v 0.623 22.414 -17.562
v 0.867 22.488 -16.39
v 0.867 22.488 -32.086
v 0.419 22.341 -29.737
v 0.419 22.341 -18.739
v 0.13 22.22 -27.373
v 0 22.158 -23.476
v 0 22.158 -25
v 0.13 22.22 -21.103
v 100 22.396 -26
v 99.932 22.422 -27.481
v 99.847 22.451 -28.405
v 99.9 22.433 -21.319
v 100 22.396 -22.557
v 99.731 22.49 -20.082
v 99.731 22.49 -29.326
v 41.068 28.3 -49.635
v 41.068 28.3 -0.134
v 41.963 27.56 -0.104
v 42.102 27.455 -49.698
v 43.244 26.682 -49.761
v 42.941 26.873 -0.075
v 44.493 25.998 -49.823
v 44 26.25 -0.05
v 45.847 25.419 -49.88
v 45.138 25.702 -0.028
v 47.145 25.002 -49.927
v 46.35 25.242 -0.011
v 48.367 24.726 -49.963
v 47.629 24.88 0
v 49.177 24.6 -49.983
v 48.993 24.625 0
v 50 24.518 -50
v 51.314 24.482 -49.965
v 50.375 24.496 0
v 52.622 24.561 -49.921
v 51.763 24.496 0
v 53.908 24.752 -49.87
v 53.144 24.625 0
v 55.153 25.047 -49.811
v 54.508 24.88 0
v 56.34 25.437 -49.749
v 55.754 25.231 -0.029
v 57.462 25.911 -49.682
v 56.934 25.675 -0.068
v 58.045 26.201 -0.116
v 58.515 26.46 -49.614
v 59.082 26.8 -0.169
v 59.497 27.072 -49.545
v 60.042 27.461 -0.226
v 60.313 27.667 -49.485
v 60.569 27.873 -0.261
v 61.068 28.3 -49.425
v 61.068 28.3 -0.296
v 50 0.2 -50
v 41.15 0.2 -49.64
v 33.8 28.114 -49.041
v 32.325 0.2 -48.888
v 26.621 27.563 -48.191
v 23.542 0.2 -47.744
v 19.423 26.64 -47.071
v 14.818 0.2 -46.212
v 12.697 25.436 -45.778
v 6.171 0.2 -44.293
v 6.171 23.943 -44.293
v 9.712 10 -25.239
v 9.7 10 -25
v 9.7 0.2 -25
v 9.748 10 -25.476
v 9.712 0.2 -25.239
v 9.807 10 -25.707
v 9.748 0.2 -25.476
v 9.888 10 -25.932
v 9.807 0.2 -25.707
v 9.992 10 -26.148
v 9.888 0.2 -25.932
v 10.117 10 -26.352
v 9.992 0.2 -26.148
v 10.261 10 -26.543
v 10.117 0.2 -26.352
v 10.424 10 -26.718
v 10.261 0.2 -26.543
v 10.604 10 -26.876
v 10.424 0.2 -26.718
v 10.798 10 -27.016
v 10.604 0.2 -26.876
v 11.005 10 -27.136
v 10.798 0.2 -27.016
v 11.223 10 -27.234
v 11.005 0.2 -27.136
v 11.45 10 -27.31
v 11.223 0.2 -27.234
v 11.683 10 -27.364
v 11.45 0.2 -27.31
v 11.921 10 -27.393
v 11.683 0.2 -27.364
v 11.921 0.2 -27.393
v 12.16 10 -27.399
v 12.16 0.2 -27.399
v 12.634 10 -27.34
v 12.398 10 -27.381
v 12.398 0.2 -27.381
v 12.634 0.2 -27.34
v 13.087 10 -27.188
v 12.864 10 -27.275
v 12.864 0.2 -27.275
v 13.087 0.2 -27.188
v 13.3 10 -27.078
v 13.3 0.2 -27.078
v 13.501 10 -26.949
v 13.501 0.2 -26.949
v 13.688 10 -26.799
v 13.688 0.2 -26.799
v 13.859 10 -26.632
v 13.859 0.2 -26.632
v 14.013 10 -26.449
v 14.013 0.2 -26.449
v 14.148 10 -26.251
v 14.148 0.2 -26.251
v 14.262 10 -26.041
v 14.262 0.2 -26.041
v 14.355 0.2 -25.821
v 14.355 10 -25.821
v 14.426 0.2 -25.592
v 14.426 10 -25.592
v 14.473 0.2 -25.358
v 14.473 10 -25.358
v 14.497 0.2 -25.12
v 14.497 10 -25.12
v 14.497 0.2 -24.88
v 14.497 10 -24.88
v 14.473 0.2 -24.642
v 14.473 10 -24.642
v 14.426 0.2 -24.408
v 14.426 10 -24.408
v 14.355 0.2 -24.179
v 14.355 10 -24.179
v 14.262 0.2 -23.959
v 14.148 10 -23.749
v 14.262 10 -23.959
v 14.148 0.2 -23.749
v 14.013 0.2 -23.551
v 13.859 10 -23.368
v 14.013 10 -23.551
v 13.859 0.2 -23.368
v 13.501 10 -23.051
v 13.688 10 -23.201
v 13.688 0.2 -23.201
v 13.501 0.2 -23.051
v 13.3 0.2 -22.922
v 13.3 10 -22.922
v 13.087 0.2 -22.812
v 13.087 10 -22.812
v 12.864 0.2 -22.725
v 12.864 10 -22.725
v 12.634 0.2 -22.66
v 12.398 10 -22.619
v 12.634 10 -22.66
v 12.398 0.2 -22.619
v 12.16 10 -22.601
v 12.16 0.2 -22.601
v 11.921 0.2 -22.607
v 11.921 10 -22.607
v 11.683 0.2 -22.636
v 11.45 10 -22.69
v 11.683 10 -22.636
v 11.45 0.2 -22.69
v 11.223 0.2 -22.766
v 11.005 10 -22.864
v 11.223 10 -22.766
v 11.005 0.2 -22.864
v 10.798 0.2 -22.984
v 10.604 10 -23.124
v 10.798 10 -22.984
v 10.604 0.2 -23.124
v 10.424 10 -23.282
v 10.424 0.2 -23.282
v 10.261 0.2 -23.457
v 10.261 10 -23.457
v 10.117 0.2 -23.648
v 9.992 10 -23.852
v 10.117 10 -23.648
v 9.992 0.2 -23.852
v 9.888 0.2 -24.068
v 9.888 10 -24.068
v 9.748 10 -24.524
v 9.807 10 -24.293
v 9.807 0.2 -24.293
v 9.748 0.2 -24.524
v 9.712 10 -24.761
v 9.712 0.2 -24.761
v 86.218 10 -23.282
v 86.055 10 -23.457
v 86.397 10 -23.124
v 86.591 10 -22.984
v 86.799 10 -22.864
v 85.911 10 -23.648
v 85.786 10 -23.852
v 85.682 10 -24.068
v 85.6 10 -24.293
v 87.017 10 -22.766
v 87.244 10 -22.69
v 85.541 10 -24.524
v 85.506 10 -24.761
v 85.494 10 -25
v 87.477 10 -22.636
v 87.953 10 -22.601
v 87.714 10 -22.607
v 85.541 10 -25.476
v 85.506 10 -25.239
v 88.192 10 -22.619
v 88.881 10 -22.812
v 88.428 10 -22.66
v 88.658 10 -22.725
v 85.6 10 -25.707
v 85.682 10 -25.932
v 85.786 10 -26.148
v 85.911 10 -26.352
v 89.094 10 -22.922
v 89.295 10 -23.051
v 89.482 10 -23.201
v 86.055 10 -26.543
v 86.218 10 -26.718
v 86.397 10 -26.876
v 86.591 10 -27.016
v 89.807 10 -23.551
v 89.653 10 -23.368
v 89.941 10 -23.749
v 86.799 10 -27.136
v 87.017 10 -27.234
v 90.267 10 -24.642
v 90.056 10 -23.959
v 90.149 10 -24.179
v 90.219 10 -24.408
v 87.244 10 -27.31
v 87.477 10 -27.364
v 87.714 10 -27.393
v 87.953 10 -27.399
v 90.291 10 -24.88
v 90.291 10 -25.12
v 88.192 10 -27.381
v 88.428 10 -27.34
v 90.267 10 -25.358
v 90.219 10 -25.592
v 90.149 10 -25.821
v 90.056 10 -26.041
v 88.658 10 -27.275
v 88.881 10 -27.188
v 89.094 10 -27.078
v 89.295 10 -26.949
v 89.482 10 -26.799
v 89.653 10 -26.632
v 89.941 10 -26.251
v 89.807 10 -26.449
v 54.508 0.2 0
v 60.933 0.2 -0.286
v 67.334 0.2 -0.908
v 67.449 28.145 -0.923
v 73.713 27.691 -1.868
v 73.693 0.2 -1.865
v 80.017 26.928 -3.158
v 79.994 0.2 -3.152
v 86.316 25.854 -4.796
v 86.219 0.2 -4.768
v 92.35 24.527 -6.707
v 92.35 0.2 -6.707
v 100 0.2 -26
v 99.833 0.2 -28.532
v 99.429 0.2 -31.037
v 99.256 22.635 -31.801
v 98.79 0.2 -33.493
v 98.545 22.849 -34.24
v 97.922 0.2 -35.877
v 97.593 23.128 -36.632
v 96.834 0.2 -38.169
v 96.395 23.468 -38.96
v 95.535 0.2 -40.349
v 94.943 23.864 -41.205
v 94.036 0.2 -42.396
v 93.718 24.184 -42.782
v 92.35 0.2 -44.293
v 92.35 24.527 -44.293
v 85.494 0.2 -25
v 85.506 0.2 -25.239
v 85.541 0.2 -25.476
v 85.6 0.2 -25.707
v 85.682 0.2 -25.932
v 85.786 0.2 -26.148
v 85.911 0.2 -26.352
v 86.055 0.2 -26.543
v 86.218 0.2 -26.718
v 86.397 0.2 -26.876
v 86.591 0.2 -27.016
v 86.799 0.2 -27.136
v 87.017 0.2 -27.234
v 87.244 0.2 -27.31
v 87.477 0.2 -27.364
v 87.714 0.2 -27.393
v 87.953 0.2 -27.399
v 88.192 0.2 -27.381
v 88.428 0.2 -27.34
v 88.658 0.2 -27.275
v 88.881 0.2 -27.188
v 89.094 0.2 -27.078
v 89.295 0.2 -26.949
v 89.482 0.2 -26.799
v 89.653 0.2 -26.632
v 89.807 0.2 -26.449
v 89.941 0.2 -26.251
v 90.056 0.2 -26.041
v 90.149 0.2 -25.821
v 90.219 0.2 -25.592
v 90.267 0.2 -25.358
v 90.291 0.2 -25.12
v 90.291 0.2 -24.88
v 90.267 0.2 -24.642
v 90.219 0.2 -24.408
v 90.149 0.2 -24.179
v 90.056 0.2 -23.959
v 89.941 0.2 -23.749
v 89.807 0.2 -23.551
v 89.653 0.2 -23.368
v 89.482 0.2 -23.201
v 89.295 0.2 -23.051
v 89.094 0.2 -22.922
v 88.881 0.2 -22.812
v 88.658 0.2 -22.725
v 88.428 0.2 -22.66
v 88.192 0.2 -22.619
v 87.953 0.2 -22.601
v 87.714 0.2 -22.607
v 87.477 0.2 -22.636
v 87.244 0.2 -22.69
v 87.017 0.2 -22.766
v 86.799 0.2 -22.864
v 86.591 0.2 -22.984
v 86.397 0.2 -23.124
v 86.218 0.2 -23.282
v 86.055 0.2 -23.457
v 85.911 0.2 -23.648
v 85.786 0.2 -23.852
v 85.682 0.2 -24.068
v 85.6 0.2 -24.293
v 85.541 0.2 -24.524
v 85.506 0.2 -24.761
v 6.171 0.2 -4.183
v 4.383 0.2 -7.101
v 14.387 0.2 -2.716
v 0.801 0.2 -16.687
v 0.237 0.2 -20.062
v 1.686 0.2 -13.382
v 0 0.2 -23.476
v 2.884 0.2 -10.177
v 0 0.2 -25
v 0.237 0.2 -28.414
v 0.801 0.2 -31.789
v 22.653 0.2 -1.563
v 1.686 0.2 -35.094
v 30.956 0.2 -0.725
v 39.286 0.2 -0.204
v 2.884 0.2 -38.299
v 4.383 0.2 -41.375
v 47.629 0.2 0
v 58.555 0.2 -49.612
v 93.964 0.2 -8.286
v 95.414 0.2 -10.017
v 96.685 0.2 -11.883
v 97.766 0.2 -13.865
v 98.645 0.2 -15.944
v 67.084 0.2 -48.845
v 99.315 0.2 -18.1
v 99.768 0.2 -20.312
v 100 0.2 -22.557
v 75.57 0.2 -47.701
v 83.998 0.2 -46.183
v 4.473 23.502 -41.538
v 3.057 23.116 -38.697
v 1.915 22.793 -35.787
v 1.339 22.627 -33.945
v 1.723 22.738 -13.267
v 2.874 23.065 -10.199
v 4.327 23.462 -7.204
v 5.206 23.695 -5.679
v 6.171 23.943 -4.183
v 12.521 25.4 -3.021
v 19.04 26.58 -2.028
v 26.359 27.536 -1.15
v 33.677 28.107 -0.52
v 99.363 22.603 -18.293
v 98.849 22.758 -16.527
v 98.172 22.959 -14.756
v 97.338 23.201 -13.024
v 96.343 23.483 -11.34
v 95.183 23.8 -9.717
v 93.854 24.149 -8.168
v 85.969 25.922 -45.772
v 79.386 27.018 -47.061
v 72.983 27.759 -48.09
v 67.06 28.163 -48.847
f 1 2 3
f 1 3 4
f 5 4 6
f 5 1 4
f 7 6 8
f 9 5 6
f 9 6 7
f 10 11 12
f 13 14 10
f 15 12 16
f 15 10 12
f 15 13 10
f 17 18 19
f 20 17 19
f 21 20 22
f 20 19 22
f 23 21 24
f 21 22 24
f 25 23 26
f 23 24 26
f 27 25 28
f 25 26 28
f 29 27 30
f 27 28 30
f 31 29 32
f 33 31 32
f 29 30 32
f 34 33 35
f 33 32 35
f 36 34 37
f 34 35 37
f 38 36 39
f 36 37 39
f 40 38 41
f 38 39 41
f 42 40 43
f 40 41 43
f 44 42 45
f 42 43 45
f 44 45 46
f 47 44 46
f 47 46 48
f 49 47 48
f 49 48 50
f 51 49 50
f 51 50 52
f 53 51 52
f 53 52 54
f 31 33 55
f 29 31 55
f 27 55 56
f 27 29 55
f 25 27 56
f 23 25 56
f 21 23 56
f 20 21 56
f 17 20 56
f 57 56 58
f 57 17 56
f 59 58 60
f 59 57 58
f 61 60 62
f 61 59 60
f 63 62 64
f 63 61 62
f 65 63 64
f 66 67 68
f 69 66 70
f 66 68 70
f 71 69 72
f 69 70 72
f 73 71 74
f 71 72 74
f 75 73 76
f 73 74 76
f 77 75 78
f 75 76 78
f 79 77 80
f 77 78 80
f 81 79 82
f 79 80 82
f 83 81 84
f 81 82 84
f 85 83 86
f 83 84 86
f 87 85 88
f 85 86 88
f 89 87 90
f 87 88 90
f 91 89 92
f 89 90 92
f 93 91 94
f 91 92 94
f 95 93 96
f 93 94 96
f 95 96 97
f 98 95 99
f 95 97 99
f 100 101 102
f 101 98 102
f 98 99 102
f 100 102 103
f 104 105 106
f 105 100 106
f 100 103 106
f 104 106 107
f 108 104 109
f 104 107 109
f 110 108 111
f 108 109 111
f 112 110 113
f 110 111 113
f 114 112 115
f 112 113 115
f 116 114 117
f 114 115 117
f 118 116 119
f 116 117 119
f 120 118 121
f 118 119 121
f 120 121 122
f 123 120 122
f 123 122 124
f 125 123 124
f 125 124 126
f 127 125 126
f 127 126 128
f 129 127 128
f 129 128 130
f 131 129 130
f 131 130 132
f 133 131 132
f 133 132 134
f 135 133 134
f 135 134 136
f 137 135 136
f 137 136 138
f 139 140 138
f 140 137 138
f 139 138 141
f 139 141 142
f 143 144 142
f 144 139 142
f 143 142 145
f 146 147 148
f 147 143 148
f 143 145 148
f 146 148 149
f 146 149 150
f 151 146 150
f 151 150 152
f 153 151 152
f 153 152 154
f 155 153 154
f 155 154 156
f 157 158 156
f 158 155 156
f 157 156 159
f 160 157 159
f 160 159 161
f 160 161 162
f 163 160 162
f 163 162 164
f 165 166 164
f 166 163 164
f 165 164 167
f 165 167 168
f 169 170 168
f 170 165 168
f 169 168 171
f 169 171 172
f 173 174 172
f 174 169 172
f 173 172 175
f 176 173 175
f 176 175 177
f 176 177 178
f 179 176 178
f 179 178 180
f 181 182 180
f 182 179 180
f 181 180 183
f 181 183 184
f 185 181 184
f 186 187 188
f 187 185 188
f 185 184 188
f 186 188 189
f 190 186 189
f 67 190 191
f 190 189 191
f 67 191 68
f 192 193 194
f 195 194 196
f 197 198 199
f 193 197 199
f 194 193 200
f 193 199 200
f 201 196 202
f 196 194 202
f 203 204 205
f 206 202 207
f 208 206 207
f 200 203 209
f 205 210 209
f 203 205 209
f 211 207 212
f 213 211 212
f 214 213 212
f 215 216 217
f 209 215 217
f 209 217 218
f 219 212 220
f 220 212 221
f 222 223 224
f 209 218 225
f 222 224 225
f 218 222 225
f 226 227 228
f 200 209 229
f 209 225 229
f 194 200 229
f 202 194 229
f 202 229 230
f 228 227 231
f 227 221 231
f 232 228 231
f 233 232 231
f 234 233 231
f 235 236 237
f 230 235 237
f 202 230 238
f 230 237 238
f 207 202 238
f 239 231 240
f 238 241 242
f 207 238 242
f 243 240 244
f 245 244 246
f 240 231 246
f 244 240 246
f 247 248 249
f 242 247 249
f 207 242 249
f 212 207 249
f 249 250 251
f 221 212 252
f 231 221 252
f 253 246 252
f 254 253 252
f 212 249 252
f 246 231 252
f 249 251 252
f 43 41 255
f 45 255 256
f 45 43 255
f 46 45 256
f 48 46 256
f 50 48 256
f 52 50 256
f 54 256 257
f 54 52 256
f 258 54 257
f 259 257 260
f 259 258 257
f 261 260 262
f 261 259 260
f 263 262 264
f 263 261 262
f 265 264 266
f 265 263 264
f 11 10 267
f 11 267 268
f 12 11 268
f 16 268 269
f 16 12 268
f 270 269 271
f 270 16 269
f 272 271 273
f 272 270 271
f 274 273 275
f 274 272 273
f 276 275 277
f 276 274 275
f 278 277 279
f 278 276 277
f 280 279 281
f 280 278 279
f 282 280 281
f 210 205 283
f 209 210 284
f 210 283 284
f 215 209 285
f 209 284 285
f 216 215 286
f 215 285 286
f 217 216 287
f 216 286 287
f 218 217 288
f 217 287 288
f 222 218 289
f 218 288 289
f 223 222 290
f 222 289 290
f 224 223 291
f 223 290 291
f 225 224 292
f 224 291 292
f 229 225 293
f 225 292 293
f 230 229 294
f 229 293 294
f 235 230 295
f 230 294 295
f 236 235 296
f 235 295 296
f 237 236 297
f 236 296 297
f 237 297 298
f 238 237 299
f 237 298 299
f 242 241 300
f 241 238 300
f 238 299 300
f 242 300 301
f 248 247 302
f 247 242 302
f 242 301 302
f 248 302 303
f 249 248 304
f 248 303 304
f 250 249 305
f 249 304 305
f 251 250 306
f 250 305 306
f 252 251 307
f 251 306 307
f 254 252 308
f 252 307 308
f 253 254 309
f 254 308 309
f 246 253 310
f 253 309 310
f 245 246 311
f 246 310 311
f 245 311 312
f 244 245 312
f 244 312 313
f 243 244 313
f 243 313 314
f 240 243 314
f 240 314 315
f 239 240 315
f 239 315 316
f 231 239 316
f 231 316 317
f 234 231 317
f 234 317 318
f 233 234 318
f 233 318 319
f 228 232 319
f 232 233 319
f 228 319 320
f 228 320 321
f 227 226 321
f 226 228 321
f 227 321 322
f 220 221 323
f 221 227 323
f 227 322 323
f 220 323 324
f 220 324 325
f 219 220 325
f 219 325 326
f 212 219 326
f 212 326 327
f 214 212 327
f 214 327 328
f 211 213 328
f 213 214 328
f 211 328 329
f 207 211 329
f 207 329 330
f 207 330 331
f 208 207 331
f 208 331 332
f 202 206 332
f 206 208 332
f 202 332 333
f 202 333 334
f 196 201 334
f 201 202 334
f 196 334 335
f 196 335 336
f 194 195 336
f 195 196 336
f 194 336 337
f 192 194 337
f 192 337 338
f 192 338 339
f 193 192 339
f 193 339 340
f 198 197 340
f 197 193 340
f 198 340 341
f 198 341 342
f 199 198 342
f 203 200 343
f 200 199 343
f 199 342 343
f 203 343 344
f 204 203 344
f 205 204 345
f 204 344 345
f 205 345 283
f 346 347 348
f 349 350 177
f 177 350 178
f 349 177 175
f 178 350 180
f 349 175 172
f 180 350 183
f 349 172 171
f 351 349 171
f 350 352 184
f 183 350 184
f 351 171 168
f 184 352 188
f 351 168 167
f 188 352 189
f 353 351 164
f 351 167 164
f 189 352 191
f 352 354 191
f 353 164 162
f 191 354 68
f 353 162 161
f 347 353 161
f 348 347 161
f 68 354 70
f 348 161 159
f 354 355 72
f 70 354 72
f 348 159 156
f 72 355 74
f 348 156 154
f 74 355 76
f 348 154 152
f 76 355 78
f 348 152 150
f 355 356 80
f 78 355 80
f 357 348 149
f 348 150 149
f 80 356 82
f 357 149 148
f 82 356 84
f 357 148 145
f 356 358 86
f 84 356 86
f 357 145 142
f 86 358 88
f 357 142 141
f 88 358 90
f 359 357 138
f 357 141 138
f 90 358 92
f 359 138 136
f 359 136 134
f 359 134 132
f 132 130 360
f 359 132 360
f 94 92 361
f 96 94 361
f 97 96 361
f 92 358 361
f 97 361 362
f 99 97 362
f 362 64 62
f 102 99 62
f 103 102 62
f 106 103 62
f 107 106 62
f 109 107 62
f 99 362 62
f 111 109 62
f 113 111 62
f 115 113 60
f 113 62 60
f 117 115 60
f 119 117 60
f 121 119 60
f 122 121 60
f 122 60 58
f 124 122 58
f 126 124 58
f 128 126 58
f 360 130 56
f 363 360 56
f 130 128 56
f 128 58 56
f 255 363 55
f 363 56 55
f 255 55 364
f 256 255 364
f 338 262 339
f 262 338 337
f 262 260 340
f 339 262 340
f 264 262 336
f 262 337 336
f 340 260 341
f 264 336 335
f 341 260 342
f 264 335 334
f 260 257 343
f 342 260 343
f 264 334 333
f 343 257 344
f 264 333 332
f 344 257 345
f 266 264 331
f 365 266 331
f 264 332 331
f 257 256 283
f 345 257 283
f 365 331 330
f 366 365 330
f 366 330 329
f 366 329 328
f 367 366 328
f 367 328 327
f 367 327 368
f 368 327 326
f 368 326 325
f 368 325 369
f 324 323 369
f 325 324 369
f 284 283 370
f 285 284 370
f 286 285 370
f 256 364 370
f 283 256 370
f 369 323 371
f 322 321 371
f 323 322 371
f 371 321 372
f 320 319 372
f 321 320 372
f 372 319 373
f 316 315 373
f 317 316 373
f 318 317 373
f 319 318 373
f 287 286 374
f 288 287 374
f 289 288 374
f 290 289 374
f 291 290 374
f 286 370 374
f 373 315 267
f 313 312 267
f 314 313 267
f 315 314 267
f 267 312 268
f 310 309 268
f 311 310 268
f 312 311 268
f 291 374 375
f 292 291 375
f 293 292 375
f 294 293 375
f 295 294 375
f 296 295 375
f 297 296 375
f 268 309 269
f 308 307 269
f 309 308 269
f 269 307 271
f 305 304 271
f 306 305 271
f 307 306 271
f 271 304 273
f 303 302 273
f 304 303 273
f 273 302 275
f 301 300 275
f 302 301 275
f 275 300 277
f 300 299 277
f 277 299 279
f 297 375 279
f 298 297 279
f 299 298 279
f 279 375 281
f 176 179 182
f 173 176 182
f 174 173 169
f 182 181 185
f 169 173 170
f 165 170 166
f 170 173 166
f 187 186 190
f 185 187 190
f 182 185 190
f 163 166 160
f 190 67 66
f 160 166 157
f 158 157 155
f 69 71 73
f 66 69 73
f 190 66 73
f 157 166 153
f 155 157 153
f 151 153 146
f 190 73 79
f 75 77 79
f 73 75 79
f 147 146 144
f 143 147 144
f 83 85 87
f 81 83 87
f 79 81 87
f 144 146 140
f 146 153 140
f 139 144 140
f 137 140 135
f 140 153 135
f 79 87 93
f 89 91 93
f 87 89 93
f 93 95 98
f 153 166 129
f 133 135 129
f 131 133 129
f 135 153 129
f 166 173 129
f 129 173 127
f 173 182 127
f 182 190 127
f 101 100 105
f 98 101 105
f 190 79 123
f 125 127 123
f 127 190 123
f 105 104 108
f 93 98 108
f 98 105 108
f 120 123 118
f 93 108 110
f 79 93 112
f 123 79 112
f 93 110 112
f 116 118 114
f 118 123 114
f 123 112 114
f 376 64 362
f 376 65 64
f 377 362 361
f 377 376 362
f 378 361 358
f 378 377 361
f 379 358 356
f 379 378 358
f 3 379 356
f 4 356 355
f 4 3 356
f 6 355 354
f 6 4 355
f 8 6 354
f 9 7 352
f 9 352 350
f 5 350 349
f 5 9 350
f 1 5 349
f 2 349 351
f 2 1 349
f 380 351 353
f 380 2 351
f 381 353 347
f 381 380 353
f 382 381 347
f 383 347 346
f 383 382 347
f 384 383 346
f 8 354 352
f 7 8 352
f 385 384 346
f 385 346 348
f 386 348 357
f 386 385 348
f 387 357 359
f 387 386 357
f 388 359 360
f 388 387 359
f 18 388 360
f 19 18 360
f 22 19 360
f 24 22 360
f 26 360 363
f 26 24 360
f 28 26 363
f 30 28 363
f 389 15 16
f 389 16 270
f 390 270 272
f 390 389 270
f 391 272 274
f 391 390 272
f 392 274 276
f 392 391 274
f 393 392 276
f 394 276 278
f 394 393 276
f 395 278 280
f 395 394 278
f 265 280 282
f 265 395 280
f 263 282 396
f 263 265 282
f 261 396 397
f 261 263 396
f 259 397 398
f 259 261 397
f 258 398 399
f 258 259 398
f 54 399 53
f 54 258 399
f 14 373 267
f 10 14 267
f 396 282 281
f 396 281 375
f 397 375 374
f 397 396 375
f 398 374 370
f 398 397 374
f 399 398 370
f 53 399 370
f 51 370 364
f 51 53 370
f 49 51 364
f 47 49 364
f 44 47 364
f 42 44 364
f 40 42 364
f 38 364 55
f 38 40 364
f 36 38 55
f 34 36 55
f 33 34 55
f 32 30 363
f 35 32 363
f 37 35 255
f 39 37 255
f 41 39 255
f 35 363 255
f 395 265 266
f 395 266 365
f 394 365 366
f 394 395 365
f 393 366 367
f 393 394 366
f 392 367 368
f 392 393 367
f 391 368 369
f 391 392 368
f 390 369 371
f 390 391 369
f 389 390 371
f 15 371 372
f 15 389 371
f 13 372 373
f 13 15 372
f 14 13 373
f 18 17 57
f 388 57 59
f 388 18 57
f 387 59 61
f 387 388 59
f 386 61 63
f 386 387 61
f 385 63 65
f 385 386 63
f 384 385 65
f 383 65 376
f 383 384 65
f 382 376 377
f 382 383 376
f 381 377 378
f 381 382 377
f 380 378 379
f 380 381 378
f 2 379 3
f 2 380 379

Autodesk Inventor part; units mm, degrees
ref_plane "YZ Plane" through (0, 0, 0) normal (1, 0, 0) x (0, 1, 0)
ref_plane "XZ Plane" through (0, 0, 0) normal (0, 1, 0) x (-1, 0, 0)
ref_plane "XY Plane" through (0, 0, 0) normal (0, 0, 1) x (1, 0, 0)
sketch "Sketch1" plane through (0, 0, 0) normal (0, 1, 0) x (-1, 0, 0)
  line L0 (-3, 0) -> (-97, 0)
  line L1 (-100, -3) -> (-100, -47)
  line L2 (-97, -50) -> (-3, -50)
  line L3 (0, -47) -> (0, -3)
  line L4 (0, -50) -> (0, -25)
  line L5 (0, -25) -> (-12.1, -25)
  circle A0 centre (-12.1, -25) radius 2.4
  line L6 (-12.1, -25) -> (-87.8936, -25)
  circle A1 centre (-87.8936, -25) radius 2.4
  arc A2 (0, -3) -> (-3, 0) centre (-3, -3) ccw
  arc A3 (-3, -50) -> (0, -47) centre (-3, -47) ccw
  arc A4 (-97, 0) -> (-100, -3) centre (-97, -3) ccw
  arc A5 (-100, -47) -> (-97, -50) centre (-97, -47) ccw
  point P0 (0, 0)
  point P1 (-100, -50)
  point P2 (-100, 0)
  dimension "d0" = 100
  dimension "d1" = 50
  dimension "d2" = 25
  dimension "d3" = 12.1
  dimension "d4" = 4.8
  dimension "d5" = 75.7936
  dimension "d6" = 4.8
  dimension "d7" = 3
extrude "Extrusion1" add sketch "Sketch1" along normal blind 10
sketch "Sketch2" plane through (0, 10, 0) normal (0, 1, 0) x (1, 0, 0)
  line L0 (2, 0) -> (98, 0)
  line L1 (100, 2) -> (100, 48)
  line L2 (98, 50) -> (2, 50)
  line L3 (0, 48) -> (0, 2)
  arc A0 (98, 0) -> (100, 2) centre (98, 2) ccw
  arc A1 (0, 2) -> (2, 0) centre (2, 2) ccw
  arc A2 (2, 50) -> (0, 48) centre (2, 48) ccw
  arc A3 (100, 48) -> (98, 50) centre (98, 48) ccw
  point P0 (0, 0)
  dimension "d10" = 2
extrude "Extrusion2" add sketch "Sketch2" along normal blind 18.3
sketch "Sketch3" plane through (3, 0, 0) normal (0, 0, 1) x (1, 0, 0)
  point P0 (-3, 0)
sketch "Sketch4" plane through (0, 28.3, 0) normal (0, 1, 0) x (1, 0, 0)
  line L0 (3, 0) -> (97, 0) projected
  arc A0 (6.1709, 4.1832) -> (50, 0) centre (48.8144, 219.278) ccw
  line L1 (0, 47) -> (0, 3) projected
  arc A1 (0, 25) -> (6.1709, 4.1832) centre (35.6265, 24.238) ccw
  arc A2 (6.1709, 44.2928) -> (0, 25) centre (35.6265, 24.238) ccw
  line L2 (97, 50) -> (3, 50) projected
  arc A3 (50, 50) -> (6.1709, 44.2928) centre (53.6635, -149.2845) ccw
  arc A4 (92.3505, 44.2928) -> (50, 50) centre (45.5073, -143.3251) ccw
  line L3 (100, 3) -> (100, 47) projected
  arc A5 (100, 25) -> (92.3505, 44.2928) centre (73.1068, 25.5) ccw
  arc A6 (92.3505, 6.7071) -> (100, 25) centre (77.2233, 23.7786) ccw
  arc A7 (50, 0) -> (92.3505, 6.7071) centre (52.254, 122.8285) ccw
  point P0 (0, 0)
extrude "Extrusion3" cut sketch "Sketch4" against normal blind 28.1 keep common part
sketch "Sketch5" plane through (47.6287, 28.3, 0) normal (0, 0, 1) x (1, 0, 0)
  line L0 (0, 0) -> (6.8792, 0) projected
  line L1 (3.4396, 0) -> (-6.5604, 0)
  line L2 (3.4396, 0) -> (13.4396, 0)
  line L3 (6.8792, 0) -> (44.7218, 0) projected
  arc A0 (-6.5604, 0) -> (13.4396, 0) centre (3.4396, 11.1803) ccw
  point P0 (-47.6287, -28.3)
  dimension "d15" = 10
  dimension "d16" = 10
  dimension "d17" = 15
extrude "Extrusion4" cut sketch "Sketch5" against normal blind 50
sketch "Sketch6" plane through (47.6287, 0.2, 0) normal (0, 0, 1) x (1, 0, 0)
  arc A0 (-6.5604, 28.1) -> (-46.762, 22.2881) centre (-6.5604, -113.8444) ccw
  arc A1 (52.1024, 22.2904) -> (13.4396, 28.1) centre (13.4396, -103.4557) ccw
  line L0 (52.1024, 22.2904) -> (52.3713, 28.1)
  line L1 (52.3713, 28.1) -> (13.4396, 28.1)
  line L2 (-6.5604, 28.1) -> (-47.6287, 28.1)
  line L3 (-47.6287, 28.1) -> (-46.762, 22.2881)
  point P0 (-47.6287, -0.2)
extrude "Extrusion5" cut sketch "Sketch6" against normal blind 50
sketch "Sketch7" plane through (47.6287, 0.2, 0) normal (0, 0, 1) x (1, 0, 0)
  line L0 (-47.6287, 28.1) -> (-47.6287, 0) projected
  arc A0 (-46.762, 22.2881) -> (-47.6287, 21.9584) centre (-45.4512, 17.5372) ccw
  line L1 (-47.6287, 21.9584) -> (-47.6287, 28.1)
  line L2 (-46.762, 22.2881) -> (-47.6287, 28.1)
  point P0 (-47.6287, -0.2)
extrude "Extrusion6" cut sketch "Sketch7" against normal blind 50
sketch "Sketch8" plane through (47.6287, 0.2, 0) normal (0, 0, 1) x (1, 0, 0)
  line L0 (52.3713, 28.1) -> (52.3713, 0) projected
  line L1 (52.1024, 22.2904) -> (52.3713, 28.1) projected
  arc A0 (52.3713, 22.1965) -> (52.1024, 22.2904) centre (49.9324, 15.6487) ccw
  line L2 (52.1024, 22.2904) -> (52.3713, 28.1)
  line L3 (52.3713, 28.1) -> (52.3713, 22.1965)
  point P0 (-47.6287, -0.2)
extrude "Extrusion7" cut sketch "Sketch8" against normal blind 50
properties part number "SSOK"
